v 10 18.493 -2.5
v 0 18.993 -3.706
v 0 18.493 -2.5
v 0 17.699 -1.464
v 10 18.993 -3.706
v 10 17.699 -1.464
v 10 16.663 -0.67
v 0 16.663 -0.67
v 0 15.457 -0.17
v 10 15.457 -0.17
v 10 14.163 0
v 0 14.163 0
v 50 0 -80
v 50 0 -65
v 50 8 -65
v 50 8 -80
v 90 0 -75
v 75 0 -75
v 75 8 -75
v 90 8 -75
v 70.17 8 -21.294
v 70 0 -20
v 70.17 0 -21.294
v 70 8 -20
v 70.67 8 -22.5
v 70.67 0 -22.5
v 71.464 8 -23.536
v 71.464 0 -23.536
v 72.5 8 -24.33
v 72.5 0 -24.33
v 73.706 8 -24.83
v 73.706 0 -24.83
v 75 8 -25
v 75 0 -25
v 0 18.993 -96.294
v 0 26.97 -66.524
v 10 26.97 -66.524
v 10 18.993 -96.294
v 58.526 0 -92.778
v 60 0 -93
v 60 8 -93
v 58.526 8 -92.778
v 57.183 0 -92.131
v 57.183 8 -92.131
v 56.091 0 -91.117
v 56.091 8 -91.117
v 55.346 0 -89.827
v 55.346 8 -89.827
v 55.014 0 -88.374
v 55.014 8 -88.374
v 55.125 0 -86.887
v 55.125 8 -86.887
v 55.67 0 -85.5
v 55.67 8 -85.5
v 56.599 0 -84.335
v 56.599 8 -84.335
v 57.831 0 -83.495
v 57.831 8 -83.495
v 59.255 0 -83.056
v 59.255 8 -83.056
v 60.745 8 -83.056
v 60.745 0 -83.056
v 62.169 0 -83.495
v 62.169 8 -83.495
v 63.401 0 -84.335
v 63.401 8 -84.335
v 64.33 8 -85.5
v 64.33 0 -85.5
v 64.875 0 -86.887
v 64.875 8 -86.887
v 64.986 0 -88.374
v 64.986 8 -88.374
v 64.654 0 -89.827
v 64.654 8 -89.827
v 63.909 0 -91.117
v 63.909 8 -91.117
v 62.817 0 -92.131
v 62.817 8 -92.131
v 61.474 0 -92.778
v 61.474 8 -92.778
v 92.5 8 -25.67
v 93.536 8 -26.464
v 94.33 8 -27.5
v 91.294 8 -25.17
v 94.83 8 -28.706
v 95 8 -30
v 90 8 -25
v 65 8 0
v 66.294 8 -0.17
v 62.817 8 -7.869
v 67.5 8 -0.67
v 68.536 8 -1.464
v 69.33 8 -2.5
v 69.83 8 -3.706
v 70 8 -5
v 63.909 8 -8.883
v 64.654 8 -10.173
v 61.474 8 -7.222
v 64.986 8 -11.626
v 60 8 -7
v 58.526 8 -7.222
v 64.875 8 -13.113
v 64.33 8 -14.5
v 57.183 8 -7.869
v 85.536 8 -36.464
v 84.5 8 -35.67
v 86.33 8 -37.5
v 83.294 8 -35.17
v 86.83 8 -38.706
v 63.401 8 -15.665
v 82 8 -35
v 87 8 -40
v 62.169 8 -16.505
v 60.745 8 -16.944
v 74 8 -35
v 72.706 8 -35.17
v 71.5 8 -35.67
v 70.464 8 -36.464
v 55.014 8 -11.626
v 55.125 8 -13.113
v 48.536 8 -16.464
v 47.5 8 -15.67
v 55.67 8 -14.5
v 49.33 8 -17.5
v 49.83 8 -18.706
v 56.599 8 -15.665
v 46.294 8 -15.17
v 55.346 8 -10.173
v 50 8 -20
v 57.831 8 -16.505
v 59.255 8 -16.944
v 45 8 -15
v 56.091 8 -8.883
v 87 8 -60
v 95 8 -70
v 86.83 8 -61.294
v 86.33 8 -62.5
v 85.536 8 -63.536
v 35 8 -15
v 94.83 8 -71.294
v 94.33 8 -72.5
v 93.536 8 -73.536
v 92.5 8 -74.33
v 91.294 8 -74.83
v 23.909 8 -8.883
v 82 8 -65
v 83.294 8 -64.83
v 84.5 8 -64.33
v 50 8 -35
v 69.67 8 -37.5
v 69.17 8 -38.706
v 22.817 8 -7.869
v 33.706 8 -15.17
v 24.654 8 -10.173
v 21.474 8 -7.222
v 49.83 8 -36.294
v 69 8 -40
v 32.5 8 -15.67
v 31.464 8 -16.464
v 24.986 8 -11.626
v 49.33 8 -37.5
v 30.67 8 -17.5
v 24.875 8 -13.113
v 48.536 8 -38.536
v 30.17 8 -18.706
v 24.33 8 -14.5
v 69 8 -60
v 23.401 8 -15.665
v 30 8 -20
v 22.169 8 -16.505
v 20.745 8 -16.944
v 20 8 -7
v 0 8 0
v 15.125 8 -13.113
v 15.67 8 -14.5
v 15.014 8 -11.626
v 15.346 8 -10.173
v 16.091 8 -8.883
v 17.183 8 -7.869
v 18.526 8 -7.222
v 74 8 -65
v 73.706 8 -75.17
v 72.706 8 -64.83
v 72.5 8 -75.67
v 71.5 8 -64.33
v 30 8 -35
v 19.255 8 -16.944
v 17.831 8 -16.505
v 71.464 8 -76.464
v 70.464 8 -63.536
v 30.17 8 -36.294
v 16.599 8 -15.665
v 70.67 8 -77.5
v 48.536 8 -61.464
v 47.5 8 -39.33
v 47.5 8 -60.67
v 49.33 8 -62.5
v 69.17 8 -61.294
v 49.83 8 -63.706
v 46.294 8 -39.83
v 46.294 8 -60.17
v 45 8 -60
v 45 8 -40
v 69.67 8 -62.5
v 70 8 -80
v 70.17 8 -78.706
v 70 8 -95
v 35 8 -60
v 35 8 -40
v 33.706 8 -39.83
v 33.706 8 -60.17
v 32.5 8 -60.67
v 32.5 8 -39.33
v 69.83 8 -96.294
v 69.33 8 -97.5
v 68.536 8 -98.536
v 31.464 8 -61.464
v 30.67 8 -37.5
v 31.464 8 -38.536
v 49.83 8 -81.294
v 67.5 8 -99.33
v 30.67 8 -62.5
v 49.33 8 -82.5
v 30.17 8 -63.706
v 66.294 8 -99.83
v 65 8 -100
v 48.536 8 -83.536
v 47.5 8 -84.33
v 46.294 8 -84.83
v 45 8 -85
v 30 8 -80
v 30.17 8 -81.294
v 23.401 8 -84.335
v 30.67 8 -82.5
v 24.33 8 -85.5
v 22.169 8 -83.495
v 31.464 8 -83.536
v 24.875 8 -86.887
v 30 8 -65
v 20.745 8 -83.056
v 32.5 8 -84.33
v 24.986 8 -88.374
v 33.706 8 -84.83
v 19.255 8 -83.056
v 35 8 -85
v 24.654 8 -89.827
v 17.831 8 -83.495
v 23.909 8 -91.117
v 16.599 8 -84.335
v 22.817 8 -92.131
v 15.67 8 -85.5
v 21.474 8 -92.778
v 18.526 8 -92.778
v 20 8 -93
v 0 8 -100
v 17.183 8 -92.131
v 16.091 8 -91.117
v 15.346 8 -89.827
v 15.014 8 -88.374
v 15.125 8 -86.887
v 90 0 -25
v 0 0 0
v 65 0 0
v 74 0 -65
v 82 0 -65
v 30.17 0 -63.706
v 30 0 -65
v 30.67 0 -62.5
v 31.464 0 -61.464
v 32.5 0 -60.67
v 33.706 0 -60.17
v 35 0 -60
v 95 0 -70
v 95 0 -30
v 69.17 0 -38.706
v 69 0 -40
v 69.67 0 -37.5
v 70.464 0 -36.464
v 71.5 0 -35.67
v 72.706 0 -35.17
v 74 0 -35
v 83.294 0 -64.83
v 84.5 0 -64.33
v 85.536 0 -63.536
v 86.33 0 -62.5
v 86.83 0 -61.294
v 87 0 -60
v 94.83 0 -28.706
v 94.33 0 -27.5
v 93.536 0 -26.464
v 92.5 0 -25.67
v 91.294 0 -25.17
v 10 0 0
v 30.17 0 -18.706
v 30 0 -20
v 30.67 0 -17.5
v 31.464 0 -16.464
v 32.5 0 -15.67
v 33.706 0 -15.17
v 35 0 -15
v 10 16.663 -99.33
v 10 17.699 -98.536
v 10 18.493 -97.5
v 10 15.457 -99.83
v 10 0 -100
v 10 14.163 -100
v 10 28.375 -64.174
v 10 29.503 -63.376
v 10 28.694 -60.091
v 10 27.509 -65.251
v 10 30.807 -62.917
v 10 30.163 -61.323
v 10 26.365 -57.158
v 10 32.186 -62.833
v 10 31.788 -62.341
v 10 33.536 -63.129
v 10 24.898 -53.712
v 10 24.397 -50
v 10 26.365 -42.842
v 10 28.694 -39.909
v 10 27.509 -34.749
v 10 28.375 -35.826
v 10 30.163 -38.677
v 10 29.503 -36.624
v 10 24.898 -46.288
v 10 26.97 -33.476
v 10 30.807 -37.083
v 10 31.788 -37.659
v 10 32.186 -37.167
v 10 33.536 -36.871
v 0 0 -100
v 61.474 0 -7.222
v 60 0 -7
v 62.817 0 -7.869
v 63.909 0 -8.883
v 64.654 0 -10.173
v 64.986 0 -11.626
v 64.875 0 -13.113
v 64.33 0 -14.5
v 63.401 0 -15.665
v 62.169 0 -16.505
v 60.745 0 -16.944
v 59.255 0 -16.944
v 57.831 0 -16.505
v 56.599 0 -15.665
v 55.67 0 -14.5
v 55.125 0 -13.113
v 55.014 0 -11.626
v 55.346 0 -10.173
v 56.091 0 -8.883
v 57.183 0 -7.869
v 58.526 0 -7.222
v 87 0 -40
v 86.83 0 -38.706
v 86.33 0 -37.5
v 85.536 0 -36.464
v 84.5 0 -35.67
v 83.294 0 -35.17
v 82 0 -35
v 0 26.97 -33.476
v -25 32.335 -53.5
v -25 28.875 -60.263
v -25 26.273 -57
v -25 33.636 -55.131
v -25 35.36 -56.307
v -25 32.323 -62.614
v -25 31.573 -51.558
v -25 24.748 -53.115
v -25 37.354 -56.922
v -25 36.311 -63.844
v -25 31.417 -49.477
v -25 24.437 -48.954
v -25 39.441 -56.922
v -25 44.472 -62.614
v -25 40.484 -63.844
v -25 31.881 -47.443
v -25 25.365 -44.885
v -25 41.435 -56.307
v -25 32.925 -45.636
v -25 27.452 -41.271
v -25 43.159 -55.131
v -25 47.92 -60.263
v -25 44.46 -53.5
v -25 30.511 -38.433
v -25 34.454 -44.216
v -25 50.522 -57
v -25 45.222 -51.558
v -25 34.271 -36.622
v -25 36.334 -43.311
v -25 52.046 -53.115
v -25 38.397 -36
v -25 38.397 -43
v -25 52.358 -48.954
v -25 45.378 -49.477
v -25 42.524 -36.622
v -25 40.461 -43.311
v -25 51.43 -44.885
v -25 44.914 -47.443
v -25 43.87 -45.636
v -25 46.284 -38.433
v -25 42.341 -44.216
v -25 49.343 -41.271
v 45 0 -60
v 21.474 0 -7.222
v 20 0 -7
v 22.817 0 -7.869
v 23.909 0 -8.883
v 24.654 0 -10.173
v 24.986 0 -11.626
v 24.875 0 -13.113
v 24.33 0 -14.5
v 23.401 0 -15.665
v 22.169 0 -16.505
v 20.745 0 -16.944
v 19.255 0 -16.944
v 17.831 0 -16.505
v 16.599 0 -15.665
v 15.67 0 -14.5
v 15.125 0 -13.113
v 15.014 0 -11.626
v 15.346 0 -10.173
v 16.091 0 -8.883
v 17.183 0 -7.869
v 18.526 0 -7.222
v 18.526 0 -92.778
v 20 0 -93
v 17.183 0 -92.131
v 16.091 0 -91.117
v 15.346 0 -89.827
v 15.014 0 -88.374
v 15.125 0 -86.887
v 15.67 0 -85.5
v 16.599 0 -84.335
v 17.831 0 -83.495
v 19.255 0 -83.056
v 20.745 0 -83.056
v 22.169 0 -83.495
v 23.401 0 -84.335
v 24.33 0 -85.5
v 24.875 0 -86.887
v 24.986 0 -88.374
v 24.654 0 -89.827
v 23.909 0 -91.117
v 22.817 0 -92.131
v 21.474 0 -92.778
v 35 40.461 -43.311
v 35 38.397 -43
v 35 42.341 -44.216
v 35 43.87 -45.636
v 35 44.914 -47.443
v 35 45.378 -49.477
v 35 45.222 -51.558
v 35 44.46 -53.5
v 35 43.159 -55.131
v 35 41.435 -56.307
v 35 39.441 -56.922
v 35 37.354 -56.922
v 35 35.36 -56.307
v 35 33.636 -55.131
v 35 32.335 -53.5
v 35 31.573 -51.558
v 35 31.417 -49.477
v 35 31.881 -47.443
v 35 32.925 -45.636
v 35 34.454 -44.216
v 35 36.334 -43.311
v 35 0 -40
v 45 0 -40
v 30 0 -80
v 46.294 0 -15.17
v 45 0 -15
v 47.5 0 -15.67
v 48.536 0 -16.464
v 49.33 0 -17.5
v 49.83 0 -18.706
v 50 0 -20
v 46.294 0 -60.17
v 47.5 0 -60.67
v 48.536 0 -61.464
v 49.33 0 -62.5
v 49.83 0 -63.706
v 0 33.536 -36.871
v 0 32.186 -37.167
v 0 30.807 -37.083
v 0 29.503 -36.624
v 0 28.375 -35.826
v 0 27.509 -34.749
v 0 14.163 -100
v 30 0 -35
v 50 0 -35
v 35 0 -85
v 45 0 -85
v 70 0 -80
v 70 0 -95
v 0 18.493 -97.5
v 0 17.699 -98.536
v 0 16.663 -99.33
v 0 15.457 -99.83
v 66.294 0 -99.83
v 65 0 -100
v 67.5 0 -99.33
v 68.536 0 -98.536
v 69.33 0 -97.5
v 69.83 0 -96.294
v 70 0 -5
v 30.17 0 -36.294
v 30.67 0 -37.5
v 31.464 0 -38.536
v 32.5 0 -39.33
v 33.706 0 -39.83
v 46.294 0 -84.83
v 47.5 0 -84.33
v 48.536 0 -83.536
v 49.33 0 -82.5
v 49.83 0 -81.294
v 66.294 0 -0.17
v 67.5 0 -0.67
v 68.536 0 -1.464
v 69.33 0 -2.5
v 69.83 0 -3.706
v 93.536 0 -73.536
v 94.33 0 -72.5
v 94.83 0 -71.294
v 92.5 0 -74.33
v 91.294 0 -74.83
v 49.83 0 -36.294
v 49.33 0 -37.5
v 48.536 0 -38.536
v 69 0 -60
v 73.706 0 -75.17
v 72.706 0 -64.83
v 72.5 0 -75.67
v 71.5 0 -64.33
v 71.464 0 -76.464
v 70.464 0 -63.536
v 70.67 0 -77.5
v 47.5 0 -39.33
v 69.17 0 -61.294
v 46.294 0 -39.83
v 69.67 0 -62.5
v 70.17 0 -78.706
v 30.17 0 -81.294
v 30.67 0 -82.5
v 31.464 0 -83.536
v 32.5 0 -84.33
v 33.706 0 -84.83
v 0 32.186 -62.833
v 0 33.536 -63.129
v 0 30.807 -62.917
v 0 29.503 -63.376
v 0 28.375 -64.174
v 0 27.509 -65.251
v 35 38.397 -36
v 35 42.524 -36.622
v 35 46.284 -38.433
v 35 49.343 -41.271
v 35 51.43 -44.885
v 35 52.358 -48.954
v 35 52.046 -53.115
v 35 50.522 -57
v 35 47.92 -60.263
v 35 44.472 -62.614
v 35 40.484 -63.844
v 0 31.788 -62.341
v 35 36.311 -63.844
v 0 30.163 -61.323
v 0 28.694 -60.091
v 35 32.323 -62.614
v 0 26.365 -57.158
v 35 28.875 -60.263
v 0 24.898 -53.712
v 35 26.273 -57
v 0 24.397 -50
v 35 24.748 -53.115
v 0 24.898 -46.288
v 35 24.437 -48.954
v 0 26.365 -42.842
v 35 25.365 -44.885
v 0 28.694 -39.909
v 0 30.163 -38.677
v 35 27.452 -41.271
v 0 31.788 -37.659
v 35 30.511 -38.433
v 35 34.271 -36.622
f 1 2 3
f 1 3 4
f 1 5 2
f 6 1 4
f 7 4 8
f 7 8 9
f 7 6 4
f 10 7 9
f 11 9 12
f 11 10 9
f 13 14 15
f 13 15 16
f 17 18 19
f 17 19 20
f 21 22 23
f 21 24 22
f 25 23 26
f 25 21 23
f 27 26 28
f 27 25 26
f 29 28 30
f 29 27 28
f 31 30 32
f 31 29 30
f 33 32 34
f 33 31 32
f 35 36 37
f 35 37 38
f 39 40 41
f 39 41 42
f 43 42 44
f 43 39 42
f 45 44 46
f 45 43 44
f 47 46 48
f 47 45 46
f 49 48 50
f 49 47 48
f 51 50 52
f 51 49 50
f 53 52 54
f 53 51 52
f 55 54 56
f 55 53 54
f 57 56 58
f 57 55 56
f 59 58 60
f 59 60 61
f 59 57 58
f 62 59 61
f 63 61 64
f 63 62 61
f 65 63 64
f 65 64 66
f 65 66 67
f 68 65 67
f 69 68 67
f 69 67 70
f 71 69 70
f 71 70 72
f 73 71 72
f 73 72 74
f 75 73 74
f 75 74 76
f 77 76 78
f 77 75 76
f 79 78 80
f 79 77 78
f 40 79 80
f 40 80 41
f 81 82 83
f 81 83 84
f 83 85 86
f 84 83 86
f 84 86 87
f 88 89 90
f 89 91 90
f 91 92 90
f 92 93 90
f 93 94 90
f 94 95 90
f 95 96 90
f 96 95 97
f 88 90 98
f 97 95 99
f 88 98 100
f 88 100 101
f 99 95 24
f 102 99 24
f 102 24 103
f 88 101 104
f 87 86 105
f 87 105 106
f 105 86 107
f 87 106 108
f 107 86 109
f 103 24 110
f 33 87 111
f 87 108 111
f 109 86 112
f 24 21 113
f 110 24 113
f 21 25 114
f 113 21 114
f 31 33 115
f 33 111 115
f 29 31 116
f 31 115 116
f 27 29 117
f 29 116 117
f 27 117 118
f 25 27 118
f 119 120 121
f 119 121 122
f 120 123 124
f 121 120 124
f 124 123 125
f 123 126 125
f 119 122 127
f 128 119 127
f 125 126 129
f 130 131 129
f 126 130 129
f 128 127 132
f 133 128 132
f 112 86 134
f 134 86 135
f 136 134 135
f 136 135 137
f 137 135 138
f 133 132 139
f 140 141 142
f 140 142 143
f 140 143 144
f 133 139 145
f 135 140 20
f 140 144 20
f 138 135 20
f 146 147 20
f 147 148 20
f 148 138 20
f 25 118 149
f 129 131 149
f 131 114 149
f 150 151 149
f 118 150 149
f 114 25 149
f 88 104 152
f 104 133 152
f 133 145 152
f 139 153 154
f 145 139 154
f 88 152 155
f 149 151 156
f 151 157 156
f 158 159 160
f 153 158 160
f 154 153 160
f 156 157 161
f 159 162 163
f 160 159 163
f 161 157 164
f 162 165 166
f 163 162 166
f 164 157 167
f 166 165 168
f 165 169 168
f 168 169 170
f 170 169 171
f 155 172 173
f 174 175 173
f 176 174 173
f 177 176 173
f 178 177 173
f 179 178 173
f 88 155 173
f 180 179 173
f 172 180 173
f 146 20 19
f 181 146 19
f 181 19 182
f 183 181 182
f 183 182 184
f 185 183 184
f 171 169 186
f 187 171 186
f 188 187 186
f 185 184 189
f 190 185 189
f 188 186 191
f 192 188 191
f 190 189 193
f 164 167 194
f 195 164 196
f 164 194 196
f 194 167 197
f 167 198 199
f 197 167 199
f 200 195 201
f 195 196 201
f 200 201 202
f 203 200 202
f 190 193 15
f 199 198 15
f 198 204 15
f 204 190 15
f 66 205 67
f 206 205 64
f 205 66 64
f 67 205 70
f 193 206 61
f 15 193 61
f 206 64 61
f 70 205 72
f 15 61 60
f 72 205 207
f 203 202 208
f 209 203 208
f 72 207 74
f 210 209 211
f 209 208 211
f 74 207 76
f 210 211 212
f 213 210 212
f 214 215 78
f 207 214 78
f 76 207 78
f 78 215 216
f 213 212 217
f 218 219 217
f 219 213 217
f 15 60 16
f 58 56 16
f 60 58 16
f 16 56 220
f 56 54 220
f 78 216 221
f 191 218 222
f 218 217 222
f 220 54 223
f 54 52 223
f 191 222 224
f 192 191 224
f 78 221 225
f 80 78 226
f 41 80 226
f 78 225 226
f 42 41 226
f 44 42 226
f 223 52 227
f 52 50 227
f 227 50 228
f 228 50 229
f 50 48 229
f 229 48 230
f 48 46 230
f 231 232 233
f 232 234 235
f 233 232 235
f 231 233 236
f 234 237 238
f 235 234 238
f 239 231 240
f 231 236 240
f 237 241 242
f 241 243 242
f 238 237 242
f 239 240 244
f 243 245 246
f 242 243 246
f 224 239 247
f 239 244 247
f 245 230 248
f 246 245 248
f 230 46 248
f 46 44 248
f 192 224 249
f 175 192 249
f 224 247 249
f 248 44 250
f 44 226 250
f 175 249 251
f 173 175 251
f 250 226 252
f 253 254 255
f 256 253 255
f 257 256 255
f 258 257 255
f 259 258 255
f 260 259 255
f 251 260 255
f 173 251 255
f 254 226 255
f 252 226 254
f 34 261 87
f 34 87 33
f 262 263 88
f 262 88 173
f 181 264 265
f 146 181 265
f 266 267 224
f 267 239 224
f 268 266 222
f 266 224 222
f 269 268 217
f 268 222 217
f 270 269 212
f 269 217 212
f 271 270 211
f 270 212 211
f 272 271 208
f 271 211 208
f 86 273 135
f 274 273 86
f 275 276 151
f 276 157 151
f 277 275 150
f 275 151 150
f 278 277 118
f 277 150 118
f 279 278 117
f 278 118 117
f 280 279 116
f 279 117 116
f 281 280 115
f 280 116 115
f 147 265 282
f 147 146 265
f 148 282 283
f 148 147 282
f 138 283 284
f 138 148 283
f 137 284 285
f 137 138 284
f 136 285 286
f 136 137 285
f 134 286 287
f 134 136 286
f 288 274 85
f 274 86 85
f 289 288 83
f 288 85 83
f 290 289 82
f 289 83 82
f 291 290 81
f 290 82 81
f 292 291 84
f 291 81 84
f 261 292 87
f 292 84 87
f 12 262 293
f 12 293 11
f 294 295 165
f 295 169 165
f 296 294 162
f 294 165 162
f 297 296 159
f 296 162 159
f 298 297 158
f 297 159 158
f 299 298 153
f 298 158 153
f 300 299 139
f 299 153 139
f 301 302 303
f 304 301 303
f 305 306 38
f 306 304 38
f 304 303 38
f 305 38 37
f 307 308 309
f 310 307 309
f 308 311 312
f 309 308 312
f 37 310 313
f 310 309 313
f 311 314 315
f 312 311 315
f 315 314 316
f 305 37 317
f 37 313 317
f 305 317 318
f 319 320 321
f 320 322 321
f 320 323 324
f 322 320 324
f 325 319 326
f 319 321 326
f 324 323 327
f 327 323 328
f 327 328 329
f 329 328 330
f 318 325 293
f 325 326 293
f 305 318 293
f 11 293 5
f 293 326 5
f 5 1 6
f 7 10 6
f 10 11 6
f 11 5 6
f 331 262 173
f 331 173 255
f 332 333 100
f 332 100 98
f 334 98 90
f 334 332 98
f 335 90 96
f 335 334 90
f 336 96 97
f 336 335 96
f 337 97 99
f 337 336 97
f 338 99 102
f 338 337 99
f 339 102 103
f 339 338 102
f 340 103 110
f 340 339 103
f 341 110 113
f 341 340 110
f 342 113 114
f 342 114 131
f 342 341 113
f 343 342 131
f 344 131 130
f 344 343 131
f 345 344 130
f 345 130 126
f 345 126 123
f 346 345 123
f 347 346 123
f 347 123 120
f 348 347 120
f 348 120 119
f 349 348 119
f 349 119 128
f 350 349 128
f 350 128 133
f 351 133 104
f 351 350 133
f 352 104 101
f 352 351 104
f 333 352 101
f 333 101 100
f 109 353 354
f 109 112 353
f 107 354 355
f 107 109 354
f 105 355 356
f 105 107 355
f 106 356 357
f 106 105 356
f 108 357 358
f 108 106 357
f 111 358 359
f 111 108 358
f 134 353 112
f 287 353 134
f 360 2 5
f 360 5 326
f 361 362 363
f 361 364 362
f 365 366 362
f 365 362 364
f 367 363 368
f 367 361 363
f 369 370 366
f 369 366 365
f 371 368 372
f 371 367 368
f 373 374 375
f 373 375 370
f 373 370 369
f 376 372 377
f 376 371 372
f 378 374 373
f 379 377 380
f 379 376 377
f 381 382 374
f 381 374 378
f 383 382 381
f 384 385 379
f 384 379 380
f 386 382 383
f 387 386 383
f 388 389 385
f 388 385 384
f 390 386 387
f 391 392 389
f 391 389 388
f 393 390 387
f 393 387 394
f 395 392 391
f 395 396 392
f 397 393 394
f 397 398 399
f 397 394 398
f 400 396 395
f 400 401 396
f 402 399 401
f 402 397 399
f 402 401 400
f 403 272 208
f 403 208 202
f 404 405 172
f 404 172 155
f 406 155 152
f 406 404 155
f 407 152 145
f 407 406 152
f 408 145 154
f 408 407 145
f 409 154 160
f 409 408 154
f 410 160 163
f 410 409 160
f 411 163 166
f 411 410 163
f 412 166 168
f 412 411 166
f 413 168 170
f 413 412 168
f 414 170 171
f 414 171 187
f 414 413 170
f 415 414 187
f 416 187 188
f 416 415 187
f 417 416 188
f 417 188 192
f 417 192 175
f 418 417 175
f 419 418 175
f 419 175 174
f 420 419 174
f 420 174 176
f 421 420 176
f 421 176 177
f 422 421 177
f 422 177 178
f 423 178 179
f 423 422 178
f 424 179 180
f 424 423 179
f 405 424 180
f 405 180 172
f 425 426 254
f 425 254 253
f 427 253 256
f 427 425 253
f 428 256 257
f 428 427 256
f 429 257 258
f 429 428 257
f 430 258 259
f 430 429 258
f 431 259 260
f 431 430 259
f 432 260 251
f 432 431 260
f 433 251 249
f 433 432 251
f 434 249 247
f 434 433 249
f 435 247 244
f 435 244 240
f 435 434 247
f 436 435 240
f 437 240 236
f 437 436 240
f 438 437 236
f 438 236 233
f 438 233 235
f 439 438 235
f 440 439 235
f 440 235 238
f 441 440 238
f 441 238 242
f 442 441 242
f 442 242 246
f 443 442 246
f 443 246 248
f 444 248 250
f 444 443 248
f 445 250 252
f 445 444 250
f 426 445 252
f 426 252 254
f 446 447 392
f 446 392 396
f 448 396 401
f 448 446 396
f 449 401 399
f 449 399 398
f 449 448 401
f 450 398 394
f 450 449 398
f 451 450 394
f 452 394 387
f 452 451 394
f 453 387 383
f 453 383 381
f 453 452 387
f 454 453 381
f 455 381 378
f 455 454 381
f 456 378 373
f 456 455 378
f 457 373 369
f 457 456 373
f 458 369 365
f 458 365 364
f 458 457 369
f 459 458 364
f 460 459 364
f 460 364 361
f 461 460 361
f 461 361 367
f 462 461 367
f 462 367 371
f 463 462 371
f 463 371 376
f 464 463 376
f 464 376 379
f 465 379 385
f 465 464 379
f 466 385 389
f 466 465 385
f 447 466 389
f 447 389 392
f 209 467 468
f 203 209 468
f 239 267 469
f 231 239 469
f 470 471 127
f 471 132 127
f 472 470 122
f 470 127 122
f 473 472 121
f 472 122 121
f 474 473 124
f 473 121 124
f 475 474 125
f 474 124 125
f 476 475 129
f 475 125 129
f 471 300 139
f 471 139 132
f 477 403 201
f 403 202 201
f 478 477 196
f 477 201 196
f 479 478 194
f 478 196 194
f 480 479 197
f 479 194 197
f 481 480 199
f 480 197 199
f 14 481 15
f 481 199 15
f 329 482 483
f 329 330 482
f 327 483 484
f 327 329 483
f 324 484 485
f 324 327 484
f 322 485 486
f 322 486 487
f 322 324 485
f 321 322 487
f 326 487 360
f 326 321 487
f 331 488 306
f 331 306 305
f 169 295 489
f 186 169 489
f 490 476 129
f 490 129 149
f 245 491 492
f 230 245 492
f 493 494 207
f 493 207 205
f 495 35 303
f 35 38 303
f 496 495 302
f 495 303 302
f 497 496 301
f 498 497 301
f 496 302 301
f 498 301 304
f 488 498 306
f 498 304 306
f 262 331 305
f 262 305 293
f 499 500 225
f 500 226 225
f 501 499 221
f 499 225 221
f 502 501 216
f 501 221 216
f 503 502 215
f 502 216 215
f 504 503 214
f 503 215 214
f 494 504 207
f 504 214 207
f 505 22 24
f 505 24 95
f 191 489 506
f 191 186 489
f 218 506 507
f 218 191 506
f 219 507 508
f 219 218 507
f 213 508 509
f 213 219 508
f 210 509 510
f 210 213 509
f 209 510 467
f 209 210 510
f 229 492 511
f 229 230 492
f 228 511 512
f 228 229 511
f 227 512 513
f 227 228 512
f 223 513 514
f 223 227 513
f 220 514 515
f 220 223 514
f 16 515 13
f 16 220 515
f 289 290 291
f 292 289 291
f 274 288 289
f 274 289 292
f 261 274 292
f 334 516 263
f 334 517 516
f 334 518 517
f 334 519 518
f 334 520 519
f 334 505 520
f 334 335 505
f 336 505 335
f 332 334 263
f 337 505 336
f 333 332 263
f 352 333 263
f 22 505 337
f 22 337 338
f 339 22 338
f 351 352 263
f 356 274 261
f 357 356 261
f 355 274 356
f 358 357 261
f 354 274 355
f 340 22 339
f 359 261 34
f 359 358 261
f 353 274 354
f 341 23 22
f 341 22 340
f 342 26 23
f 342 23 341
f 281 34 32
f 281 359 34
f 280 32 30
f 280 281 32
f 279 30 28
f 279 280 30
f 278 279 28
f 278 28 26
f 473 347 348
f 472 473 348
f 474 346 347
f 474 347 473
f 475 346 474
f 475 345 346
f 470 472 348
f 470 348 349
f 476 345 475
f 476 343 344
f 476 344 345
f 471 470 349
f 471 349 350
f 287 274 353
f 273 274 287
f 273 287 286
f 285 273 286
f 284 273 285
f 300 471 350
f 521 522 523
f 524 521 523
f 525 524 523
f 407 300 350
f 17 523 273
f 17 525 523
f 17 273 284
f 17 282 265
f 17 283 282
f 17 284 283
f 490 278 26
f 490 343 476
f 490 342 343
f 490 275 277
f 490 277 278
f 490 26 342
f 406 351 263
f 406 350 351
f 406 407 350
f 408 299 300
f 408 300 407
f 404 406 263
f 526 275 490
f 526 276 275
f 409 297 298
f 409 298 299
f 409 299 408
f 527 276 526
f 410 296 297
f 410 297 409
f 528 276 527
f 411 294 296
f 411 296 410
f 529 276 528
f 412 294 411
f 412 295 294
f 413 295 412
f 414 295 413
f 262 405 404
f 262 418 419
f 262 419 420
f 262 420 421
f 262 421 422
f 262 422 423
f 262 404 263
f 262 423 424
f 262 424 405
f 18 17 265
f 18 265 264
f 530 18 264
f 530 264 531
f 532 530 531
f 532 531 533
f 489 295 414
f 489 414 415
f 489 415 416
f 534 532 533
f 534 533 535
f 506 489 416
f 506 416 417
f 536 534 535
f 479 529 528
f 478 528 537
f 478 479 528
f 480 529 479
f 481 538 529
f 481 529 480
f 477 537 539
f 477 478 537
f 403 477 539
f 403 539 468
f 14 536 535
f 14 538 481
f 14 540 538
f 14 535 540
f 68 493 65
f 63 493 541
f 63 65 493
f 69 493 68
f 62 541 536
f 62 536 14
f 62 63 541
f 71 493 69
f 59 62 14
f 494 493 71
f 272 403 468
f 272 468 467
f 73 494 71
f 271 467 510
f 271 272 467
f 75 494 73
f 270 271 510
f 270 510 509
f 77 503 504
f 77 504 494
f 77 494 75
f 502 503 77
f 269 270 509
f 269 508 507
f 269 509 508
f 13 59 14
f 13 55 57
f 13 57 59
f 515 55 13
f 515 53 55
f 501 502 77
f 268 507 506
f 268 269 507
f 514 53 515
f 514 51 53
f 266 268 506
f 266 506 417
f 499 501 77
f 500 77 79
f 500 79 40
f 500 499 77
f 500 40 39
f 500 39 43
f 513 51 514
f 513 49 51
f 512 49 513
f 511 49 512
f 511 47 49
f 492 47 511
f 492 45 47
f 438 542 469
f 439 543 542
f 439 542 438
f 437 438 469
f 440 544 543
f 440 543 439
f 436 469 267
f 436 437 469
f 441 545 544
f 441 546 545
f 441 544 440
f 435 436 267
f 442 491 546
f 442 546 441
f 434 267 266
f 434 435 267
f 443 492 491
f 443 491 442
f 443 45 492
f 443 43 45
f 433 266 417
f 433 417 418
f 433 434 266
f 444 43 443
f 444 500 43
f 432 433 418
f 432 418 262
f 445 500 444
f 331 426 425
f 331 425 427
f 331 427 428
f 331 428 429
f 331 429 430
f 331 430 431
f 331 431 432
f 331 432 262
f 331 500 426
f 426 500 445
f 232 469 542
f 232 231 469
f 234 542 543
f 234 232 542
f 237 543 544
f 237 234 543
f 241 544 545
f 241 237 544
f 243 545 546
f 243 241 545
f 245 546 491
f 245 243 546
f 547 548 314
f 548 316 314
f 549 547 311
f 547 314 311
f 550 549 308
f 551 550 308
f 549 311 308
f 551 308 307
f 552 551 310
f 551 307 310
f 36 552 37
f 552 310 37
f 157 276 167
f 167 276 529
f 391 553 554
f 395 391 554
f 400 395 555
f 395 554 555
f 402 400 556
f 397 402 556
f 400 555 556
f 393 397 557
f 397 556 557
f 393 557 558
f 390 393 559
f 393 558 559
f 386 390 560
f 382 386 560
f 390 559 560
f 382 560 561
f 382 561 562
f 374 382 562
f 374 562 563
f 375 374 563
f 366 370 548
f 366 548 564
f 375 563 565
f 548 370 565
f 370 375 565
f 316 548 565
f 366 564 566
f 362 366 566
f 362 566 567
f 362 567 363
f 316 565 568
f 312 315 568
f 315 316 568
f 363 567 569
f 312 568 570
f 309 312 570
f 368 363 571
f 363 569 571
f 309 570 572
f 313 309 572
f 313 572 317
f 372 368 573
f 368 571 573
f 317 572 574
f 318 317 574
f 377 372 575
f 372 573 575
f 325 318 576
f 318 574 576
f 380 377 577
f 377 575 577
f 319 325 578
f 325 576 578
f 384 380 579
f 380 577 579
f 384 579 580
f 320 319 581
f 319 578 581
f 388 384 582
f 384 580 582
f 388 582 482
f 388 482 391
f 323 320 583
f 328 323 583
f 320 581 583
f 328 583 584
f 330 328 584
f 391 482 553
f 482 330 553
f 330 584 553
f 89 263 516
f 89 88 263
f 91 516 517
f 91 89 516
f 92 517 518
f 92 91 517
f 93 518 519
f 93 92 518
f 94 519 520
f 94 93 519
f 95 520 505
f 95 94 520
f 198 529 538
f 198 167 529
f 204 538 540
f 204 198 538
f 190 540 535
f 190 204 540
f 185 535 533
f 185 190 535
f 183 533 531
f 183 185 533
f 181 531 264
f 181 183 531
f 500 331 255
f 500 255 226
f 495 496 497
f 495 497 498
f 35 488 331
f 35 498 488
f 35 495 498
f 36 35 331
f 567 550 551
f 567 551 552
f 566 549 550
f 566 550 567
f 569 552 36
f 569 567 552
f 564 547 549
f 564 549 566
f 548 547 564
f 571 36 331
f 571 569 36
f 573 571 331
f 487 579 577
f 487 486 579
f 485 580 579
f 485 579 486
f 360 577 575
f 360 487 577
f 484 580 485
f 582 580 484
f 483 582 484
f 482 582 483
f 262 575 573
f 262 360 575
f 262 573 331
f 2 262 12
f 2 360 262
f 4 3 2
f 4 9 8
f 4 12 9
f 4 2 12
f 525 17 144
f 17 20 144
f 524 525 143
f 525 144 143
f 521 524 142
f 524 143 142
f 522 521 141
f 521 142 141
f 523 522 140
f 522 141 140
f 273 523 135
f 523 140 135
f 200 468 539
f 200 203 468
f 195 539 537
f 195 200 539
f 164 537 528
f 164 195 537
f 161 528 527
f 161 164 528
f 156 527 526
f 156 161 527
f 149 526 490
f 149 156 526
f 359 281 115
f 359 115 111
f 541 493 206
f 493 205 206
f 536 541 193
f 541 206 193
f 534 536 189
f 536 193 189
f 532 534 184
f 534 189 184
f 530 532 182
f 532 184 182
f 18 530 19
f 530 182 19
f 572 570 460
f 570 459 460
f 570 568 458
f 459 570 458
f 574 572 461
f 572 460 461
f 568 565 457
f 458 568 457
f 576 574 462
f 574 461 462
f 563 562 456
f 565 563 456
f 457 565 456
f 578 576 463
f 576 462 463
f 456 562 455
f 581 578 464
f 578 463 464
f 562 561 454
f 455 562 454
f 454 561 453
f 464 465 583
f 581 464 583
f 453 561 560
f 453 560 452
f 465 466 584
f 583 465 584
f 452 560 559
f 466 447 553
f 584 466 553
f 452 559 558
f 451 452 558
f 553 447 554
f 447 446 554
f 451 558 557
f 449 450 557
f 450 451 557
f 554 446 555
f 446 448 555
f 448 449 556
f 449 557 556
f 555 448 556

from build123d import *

# Parameters (mm, degrees)
SKETCH1_R                = 5
SKETCH1_W                = 20
SKETCH1_H                = 25
SKETCH1_W_2              = 18
SKETCH1_H_2              = 30
BOSS_EXTRUDE1_DEPTH      = 8
FILLET1_R                = 5
BOSS_EXTRUDE2_DEPTH      = 10
BOSS_EXTRUDE3_DEPTH      = 25
BOSS_EXTRUDE3_DEPTH_BACK = 35
SKETCH3_3_R              = 14
SKETCH3_3_R_2            = 7
FILLET2_R                = 5


with BuildPart() as part:
    # Sketch1 → Boss-Extrude1 (new body)
    with BuildSketch(Plane(origin=(0, 0, 0), x_dir=(1, 0, 0), z_dir=(0, 1, 0))):
        Polygon((0, 100), (70, 100), (70, 75), (95, 75), (95, 25), (70, 25), (70, 0), (0, 0), align=None)
        with Locations((60, 12)):
            Circle(SKETCH1_R, mode=Mode.SUBTRACT)
        with Locations((20, 12)):
            Circle(SKETCH1_R, mode=Mode.SUBTRACT)
        with Locations((20, 88)):
            Circle(SKETCH1_R, mode=Mode.SUBTRACT)
        with Locations((60, 88)):
            Circle(SKETCH1_R, mode=Mode.SUBTRACT)
        with Locations((40, 72.5)):
            Rectangle(SKETCH1_W, SKETCH1_H, mode=Mode.SUBTRACT)
        with Locations((40, 27.5)):
            Rectangle(SKETCH1_W, SKETCH1_H, mode=Mode.SUBTRACT)
        with Locations((78, 50)):
            Rectangle(SKETCH1_W_2, SKETCH1_H_2, mode=Mode.SUBTRACT)
    extrude(amount=BOSS_EXTRUDE1_DEPTH)

    # Fillet1
    fillet1_edges = [part.edges().sort_by_distance(p)[0] for p in [
        (70, 4, -25),
        (70, 4, 0),
        (95, 4, -25),
        (95, 4, -75),
        (70, 4, -100),
        (70, 4, -75),
        (87, 4, -65),
        (69, 4, -65),
        (87, 4, -35),
        (69, 4, -35),
        (50, 4, -15),
        (50, 4, -40),
        (30, 4, -40),
        (30, 4, -15),
        (30, 4, -60),
        (50, 4, -85),
        (50, 4, -60),
        (30, 4, -85),
    ]]
    fillet(fillet1_edges, radius=FILLET1_R)


with BuildPart() as body_2:
    # Sketch3 → Boss-Extrude2 (new body)
    with BuildSketch(Plane.ZY):
        with BuildLine():
            Line((-100, 18), (-100, 0))
            Line((-100, 0), (0, 0))
            Line((0, 0), (0, 18))
            Line((0, 18), (-39.908743007, 28.69351546))
            ThreePointArc((-39.908743007, 28.69351546), (-50, 24.397459622), (-60.091256993, 28.69351546))
            Line((-60.091256993, 28.69351546), (-100, 18))
        make_face()
    extrude(amount=-BOSS_EXTRUDE2_DEPTH)

    # Sketch3<3> → Boss-Extrude3 (add, two sides: drawn at the far end of the back side and taken through both)
    with BuildSketch(Plane.ZY.offset(-BOSS_EXTRUDE3_DEPTH_BACK)):
        with Locations((-50, 38.397459622)):
            Circle(SKETCH3_3_R)
        with Locations((-50, 38.397459622)):
            Circle(SKETCH3_3_R_2, mode=Mode.SUBTRACT)
    extrude(amount=BOSS_EXTRUDE3_DEPTH + BOSS_EXTRUDE3_DEPTH_BACK)

    # Fillet2
    fillet2_edges = [body_2.edges().sort_by_distance(p)[0] for p in [
        (5, 18, -100),
        (5, 18, 0),
        (5, 28.69351546, -60.091256993),
        (5, 28.69351546, -39.908743007),
    ]]
    fillet(fillet2_edges, radius=FILLET2_R)


solid = Compound([part.part, body_2.part])
